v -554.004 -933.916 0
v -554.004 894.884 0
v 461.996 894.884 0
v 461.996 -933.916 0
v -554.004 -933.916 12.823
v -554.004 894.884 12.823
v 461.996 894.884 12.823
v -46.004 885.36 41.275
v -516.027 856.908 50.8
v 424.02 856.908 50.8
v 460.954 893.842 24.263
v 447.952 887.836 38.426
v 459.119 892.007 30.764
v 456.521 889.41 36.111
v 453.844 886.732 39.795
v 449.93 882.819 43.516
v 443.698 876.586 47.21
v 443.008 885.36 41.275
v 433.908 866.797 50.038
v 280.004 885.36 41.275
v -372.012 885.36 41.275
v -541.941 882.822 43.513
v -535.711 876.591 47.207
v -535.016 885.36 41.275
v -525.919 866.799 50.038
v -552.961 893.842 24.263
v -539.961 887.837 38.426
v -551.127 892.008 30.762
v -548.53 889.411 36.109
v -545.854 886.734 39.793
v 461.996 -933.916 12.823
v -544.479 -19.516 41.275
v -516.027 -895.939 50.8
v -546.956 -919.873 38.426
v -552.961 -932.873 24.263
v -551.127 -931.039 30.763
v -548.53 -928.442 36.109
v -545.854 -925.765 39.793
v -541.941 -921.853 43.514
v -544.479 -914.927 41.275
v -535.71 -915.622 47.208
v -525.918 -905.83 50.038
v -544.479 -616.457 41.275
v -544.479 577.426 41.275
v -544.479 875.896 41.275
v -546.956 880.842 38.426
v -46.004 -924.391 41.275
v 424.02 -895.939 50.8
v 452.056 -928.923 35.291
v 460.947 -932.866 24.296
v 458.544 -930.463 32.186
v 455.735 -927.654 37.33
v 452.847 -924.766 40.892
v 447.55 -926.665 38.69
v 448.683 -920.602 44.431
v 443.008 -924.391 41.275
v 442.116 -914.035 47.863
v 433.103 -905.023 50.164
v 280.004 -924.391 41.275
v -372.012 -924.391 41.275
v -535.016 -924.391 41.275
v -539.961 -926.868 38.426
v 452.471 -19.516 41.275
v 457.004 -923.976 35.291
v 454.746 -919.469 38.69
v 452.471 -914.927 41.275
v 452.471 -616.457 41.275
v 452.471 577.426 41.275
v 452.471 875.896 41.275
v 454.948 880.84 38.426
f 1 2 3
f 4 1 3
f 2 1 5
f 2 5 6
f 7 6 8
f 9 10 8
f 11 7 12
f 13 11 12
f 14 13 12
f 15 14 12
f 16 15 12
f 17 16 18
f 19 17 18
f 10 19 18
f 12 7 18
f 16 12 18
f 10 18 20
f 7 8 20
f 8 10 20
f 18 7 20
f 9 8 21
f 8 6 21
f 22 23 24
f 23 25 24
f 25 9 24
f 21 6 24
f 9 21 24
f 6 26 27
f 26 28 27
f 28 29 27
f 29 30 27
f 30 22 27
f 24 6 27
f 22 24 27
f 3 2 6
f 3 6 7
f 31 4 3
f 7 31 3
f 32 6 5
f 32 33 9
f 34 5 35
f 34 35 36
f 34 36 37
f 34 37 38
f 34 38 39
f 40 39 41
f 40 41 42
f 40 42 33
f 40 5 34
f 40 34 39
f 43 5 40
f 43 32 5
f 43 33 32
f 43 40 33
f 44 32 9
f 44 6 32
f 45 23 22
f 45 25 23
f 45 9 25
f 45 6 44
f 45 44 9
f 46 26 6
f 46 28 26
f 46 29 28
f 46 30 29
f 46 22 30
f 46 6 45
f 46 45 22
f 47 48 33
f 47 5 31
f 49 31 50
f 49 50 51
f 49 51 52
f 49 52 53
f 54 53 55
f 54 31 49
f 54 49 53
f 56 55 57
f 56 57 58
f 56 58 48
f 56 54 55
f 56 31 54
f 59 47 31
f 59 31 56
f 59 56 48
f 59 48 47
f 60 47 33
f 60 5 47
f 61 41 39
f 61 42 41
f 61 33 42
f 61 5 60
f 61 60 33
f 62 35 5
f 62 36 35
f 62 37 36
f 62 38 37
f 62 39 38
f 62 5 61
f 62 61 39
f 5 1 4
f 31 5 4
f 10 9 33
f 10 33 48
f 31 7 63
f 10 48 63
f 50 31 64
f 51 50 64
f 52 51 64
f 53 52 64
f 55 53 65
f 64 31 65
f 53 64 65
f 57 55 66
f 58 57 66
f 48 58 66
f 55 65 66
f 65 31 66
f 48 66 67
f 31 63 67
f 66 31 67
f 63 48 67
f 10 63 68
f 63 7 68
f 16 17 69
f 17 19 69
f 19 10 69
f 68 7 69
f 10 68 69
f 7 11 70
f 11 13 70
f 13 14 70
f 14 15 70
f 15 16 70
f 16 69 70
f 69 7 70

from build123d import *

# Parameters (mm, degrees)
F0_W        = 1016
F0_H        = 1828.8
F1_DEPTH    = 50.8
F2_T1_DEPTH = 1206.4995000007
F2_T3_DEPTH = 2019.2995000007


# Not quite as in the source:
# - a fillet or chamfer that OpenCascade refuses, or shapes differently, is made with other operations: its cross-section is extruded or revolved along the edge and cut away or added


with BuildPart() as f1:
    # F0 (on Top) → F1 (new body)
    with BuildSketch(Plane.XY):
        with Locations((-46.0038529815, -19.5155441761)):
            Rectangle(F0_W, F0_H)
    extrude(amount=F1_DEPTH)

    # F2: fillet of radius 38.1 on 4 edges, made by hand

    # F2_s2 → F2_t1 (cut)
    with BuildSketch(Plane.YZ.offset(-649.2536029818)):
        with BuildLine():
            add(Edge.make_bspline(
                [(-933.9156441761, 12.7001), (-933.9156441761, 50.8001), (-895.8156441761, 50.8001)],
                knots=[0, 0, 0, 1, 1, 1], degree=2, weights=[1, 1, 1]))
            Line((-895.8156441761, 50.8001), (-895.8156441761, 51.5621))
            ThreePointArc((-895.8156441761, 51.5621), (-914.8655941761, 51.562), (-933.9155441761, 51.562))
            Line((-933.9155441761, 51.562), (-934.6775441761, 50.8))
            ThreePointArc((-934.6775441761, 50.8), (-934.6775441761, 31.75005), (-934.6776441761, 12.7001))
            Line((-934.6776441761, 12.7001), (-933.9156441761, 12.7001))
        make_face()
        with BuildLine():
            add(Edge.make_bspline(
                [(894.8845558239, 12.7001), (894.8845558239, 50.8001), (856.7845558239, 50.8001)],
                knots=[0, 0, 0, 1, 1, 1], degree=2, weights=[1, 1, 1]))
            Line((856.7845558239, 50.8001), (856.7845558239, 51.5621))
            ThreePointArc((856.7845558239, 51.5621), (875.8345058239, 51.562), (894.8844558239, 51.562))
            Line((894.8844558239, 51.562), (895.6464558239, 50.8))
            ThreePointArc((895.6464558239, 50.8), (895.6464558239, 31.75005), (895.6465558239, 12.7001))
            Line((895.6465558239, 12.7001), (894.8845558239, 12.7001))
        make_face()
    extrude(amount=F2_T1_DEPTH, mode=Mode.SUBTRACT)

    # F2_s4 → F2_t3 (cut)
    with BuildSketch(Plane.XZ.offset(-990.1342058242)):
        with BuildLine():
            add(Edge.make_bspline(
                [(461.9962470185, 12.7001), (461.9962470185, 50.8001), (423.8962470185, 50.8001)],
                knots=[0, 0, 0, 1, 1, 1], degree=2, weights=[1, 1, 1]))
            Line((423.8962470185, 50.8001), (423.8962470185, 51.5621))
            ThreePointArc((423.8962470185, 51.5621), (442.9461970185, 51.562), (461.9961470185, 51.562))
            Line((461.9961470185, 51.562), (462.7581470185, 50.8))
            ThreePointArc((462.7581470185, 50.8), (462.7581470185, 31.75005), (462.7582470185, 12.7001))
            Line((462.7582470185, 12.7001), (461.9962470185, 12.7001))
        make_face()
        with BuildLine():
            add(Edge.make_bspline(
                [(-554.0039529815, 12.7001), (-554.0039529815, 50.8001), (-515.9039529815, 50.8001)],
                knots=[0, 0, 0, 1, 1, 1], degree=2, weights=[1, 1, 1]))
            Line((-515.9039529815, 50.8001), (-515.9039529815, 51.5621))
            ThreePointArc((-515.9039529815, 51.5621), (-534.9539029815, 51.562), (-554.0038529815, 51.562))
            Line((-554.0038529815, 51.562), (-554.7658529815, 50.8))
            ThreePointArc((-554.7658529815, 50.8), (-554.7658529815, 31.75005), (-554.7659529815, 12.7001))
            Line((-554.7659529815, 12.7001), (-554.0039529815, 12.7001))
        make_face()
    extrude(amount=F2_T3_DEPTH, mode=Mode.SUBTRACT)


solid = f1.part
